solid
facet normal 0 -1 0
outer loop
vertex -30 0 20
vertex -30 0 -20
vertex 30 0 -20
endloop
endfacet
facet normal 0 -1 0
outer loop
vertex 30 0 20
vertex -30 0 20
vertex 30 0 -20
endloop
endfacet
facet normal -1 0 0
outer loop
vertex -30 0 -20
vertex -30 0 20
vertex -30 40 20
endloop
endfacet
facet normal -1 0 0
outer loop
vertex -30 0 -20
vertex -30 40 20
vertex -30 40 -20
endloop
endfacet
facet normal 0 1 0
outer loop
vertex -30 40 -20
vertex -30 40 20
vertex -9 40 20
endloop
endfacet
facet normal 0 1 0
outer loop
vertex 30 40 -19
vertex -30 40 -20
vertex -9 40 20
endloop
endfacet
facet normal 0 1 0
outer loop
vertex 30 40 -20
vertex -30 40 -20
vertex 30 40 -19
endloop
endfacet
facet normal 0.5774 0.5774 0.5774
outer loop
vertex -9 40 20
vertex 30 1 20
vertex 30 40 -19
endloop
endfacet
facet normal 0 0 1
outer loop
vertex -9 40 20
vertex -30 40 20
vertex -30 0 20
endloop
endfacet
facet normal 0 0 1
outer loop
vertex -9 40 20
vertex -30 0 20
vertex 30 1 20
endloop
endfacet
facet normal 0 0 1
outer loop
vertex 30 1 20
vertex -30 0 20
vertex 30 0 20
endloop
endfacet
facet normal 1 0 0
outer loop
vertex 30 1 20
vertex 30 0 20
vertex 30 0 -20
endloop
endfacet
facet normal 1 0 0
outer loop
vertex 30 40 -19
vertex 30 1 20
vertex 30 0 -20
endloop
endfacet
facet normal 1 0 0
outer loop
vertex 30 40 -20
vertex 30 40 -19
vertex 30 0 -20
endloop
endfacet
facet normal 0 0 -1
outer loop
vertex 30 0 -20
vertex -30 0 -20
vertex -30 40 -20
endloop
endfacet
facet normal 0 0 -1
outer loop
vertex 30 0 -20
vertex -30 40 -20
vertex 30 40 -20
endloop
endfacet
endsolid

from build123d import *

# Parameters (mm, degrees)
CROQUIS1_W              = 60
CROQUIS1_H              = 40
SALIENTE_EXTRUIR1_DEPTH = 40
CHAFL_N1_START          = -14.142135624
CHAFL_N1_DEPTH          = 56.568542495


with BuildPart() as part:
    # Croquis1 → Saliente-Extruir1 (new body)
    with BuildSketch(Plane(origin=(0, 0, 0), x_dir=(1, 0, 0), z_dir=(0, 1, 0))):
        Rectangle(CROQUIS1_W, CROQUIS1_H)
    extrude(amount=SALIENTE_EXTRUIR1_DEPTH)

    # Chaflán1: read off the stored shape, not the designer's step
    # Chaflán1 outline → Chaflán1 (cut)
    with BuildSketch(Plane(origin=(0, 0, 0), x_dir=(1, 0, 0), z_dir=(0, 0.7071067811865476, -0.7071067811865476)).offset(CHAFL_N1_START)):
        Polygon((30, -14.849242405), (-9, -42.426406871), (-10, -43.133513652), (-10, -44), (30, -44), align=None)
    extrude(amount=CHAFL_N1_DEPTH, mode=Mode.SUBTRACT)


solid = part.part
